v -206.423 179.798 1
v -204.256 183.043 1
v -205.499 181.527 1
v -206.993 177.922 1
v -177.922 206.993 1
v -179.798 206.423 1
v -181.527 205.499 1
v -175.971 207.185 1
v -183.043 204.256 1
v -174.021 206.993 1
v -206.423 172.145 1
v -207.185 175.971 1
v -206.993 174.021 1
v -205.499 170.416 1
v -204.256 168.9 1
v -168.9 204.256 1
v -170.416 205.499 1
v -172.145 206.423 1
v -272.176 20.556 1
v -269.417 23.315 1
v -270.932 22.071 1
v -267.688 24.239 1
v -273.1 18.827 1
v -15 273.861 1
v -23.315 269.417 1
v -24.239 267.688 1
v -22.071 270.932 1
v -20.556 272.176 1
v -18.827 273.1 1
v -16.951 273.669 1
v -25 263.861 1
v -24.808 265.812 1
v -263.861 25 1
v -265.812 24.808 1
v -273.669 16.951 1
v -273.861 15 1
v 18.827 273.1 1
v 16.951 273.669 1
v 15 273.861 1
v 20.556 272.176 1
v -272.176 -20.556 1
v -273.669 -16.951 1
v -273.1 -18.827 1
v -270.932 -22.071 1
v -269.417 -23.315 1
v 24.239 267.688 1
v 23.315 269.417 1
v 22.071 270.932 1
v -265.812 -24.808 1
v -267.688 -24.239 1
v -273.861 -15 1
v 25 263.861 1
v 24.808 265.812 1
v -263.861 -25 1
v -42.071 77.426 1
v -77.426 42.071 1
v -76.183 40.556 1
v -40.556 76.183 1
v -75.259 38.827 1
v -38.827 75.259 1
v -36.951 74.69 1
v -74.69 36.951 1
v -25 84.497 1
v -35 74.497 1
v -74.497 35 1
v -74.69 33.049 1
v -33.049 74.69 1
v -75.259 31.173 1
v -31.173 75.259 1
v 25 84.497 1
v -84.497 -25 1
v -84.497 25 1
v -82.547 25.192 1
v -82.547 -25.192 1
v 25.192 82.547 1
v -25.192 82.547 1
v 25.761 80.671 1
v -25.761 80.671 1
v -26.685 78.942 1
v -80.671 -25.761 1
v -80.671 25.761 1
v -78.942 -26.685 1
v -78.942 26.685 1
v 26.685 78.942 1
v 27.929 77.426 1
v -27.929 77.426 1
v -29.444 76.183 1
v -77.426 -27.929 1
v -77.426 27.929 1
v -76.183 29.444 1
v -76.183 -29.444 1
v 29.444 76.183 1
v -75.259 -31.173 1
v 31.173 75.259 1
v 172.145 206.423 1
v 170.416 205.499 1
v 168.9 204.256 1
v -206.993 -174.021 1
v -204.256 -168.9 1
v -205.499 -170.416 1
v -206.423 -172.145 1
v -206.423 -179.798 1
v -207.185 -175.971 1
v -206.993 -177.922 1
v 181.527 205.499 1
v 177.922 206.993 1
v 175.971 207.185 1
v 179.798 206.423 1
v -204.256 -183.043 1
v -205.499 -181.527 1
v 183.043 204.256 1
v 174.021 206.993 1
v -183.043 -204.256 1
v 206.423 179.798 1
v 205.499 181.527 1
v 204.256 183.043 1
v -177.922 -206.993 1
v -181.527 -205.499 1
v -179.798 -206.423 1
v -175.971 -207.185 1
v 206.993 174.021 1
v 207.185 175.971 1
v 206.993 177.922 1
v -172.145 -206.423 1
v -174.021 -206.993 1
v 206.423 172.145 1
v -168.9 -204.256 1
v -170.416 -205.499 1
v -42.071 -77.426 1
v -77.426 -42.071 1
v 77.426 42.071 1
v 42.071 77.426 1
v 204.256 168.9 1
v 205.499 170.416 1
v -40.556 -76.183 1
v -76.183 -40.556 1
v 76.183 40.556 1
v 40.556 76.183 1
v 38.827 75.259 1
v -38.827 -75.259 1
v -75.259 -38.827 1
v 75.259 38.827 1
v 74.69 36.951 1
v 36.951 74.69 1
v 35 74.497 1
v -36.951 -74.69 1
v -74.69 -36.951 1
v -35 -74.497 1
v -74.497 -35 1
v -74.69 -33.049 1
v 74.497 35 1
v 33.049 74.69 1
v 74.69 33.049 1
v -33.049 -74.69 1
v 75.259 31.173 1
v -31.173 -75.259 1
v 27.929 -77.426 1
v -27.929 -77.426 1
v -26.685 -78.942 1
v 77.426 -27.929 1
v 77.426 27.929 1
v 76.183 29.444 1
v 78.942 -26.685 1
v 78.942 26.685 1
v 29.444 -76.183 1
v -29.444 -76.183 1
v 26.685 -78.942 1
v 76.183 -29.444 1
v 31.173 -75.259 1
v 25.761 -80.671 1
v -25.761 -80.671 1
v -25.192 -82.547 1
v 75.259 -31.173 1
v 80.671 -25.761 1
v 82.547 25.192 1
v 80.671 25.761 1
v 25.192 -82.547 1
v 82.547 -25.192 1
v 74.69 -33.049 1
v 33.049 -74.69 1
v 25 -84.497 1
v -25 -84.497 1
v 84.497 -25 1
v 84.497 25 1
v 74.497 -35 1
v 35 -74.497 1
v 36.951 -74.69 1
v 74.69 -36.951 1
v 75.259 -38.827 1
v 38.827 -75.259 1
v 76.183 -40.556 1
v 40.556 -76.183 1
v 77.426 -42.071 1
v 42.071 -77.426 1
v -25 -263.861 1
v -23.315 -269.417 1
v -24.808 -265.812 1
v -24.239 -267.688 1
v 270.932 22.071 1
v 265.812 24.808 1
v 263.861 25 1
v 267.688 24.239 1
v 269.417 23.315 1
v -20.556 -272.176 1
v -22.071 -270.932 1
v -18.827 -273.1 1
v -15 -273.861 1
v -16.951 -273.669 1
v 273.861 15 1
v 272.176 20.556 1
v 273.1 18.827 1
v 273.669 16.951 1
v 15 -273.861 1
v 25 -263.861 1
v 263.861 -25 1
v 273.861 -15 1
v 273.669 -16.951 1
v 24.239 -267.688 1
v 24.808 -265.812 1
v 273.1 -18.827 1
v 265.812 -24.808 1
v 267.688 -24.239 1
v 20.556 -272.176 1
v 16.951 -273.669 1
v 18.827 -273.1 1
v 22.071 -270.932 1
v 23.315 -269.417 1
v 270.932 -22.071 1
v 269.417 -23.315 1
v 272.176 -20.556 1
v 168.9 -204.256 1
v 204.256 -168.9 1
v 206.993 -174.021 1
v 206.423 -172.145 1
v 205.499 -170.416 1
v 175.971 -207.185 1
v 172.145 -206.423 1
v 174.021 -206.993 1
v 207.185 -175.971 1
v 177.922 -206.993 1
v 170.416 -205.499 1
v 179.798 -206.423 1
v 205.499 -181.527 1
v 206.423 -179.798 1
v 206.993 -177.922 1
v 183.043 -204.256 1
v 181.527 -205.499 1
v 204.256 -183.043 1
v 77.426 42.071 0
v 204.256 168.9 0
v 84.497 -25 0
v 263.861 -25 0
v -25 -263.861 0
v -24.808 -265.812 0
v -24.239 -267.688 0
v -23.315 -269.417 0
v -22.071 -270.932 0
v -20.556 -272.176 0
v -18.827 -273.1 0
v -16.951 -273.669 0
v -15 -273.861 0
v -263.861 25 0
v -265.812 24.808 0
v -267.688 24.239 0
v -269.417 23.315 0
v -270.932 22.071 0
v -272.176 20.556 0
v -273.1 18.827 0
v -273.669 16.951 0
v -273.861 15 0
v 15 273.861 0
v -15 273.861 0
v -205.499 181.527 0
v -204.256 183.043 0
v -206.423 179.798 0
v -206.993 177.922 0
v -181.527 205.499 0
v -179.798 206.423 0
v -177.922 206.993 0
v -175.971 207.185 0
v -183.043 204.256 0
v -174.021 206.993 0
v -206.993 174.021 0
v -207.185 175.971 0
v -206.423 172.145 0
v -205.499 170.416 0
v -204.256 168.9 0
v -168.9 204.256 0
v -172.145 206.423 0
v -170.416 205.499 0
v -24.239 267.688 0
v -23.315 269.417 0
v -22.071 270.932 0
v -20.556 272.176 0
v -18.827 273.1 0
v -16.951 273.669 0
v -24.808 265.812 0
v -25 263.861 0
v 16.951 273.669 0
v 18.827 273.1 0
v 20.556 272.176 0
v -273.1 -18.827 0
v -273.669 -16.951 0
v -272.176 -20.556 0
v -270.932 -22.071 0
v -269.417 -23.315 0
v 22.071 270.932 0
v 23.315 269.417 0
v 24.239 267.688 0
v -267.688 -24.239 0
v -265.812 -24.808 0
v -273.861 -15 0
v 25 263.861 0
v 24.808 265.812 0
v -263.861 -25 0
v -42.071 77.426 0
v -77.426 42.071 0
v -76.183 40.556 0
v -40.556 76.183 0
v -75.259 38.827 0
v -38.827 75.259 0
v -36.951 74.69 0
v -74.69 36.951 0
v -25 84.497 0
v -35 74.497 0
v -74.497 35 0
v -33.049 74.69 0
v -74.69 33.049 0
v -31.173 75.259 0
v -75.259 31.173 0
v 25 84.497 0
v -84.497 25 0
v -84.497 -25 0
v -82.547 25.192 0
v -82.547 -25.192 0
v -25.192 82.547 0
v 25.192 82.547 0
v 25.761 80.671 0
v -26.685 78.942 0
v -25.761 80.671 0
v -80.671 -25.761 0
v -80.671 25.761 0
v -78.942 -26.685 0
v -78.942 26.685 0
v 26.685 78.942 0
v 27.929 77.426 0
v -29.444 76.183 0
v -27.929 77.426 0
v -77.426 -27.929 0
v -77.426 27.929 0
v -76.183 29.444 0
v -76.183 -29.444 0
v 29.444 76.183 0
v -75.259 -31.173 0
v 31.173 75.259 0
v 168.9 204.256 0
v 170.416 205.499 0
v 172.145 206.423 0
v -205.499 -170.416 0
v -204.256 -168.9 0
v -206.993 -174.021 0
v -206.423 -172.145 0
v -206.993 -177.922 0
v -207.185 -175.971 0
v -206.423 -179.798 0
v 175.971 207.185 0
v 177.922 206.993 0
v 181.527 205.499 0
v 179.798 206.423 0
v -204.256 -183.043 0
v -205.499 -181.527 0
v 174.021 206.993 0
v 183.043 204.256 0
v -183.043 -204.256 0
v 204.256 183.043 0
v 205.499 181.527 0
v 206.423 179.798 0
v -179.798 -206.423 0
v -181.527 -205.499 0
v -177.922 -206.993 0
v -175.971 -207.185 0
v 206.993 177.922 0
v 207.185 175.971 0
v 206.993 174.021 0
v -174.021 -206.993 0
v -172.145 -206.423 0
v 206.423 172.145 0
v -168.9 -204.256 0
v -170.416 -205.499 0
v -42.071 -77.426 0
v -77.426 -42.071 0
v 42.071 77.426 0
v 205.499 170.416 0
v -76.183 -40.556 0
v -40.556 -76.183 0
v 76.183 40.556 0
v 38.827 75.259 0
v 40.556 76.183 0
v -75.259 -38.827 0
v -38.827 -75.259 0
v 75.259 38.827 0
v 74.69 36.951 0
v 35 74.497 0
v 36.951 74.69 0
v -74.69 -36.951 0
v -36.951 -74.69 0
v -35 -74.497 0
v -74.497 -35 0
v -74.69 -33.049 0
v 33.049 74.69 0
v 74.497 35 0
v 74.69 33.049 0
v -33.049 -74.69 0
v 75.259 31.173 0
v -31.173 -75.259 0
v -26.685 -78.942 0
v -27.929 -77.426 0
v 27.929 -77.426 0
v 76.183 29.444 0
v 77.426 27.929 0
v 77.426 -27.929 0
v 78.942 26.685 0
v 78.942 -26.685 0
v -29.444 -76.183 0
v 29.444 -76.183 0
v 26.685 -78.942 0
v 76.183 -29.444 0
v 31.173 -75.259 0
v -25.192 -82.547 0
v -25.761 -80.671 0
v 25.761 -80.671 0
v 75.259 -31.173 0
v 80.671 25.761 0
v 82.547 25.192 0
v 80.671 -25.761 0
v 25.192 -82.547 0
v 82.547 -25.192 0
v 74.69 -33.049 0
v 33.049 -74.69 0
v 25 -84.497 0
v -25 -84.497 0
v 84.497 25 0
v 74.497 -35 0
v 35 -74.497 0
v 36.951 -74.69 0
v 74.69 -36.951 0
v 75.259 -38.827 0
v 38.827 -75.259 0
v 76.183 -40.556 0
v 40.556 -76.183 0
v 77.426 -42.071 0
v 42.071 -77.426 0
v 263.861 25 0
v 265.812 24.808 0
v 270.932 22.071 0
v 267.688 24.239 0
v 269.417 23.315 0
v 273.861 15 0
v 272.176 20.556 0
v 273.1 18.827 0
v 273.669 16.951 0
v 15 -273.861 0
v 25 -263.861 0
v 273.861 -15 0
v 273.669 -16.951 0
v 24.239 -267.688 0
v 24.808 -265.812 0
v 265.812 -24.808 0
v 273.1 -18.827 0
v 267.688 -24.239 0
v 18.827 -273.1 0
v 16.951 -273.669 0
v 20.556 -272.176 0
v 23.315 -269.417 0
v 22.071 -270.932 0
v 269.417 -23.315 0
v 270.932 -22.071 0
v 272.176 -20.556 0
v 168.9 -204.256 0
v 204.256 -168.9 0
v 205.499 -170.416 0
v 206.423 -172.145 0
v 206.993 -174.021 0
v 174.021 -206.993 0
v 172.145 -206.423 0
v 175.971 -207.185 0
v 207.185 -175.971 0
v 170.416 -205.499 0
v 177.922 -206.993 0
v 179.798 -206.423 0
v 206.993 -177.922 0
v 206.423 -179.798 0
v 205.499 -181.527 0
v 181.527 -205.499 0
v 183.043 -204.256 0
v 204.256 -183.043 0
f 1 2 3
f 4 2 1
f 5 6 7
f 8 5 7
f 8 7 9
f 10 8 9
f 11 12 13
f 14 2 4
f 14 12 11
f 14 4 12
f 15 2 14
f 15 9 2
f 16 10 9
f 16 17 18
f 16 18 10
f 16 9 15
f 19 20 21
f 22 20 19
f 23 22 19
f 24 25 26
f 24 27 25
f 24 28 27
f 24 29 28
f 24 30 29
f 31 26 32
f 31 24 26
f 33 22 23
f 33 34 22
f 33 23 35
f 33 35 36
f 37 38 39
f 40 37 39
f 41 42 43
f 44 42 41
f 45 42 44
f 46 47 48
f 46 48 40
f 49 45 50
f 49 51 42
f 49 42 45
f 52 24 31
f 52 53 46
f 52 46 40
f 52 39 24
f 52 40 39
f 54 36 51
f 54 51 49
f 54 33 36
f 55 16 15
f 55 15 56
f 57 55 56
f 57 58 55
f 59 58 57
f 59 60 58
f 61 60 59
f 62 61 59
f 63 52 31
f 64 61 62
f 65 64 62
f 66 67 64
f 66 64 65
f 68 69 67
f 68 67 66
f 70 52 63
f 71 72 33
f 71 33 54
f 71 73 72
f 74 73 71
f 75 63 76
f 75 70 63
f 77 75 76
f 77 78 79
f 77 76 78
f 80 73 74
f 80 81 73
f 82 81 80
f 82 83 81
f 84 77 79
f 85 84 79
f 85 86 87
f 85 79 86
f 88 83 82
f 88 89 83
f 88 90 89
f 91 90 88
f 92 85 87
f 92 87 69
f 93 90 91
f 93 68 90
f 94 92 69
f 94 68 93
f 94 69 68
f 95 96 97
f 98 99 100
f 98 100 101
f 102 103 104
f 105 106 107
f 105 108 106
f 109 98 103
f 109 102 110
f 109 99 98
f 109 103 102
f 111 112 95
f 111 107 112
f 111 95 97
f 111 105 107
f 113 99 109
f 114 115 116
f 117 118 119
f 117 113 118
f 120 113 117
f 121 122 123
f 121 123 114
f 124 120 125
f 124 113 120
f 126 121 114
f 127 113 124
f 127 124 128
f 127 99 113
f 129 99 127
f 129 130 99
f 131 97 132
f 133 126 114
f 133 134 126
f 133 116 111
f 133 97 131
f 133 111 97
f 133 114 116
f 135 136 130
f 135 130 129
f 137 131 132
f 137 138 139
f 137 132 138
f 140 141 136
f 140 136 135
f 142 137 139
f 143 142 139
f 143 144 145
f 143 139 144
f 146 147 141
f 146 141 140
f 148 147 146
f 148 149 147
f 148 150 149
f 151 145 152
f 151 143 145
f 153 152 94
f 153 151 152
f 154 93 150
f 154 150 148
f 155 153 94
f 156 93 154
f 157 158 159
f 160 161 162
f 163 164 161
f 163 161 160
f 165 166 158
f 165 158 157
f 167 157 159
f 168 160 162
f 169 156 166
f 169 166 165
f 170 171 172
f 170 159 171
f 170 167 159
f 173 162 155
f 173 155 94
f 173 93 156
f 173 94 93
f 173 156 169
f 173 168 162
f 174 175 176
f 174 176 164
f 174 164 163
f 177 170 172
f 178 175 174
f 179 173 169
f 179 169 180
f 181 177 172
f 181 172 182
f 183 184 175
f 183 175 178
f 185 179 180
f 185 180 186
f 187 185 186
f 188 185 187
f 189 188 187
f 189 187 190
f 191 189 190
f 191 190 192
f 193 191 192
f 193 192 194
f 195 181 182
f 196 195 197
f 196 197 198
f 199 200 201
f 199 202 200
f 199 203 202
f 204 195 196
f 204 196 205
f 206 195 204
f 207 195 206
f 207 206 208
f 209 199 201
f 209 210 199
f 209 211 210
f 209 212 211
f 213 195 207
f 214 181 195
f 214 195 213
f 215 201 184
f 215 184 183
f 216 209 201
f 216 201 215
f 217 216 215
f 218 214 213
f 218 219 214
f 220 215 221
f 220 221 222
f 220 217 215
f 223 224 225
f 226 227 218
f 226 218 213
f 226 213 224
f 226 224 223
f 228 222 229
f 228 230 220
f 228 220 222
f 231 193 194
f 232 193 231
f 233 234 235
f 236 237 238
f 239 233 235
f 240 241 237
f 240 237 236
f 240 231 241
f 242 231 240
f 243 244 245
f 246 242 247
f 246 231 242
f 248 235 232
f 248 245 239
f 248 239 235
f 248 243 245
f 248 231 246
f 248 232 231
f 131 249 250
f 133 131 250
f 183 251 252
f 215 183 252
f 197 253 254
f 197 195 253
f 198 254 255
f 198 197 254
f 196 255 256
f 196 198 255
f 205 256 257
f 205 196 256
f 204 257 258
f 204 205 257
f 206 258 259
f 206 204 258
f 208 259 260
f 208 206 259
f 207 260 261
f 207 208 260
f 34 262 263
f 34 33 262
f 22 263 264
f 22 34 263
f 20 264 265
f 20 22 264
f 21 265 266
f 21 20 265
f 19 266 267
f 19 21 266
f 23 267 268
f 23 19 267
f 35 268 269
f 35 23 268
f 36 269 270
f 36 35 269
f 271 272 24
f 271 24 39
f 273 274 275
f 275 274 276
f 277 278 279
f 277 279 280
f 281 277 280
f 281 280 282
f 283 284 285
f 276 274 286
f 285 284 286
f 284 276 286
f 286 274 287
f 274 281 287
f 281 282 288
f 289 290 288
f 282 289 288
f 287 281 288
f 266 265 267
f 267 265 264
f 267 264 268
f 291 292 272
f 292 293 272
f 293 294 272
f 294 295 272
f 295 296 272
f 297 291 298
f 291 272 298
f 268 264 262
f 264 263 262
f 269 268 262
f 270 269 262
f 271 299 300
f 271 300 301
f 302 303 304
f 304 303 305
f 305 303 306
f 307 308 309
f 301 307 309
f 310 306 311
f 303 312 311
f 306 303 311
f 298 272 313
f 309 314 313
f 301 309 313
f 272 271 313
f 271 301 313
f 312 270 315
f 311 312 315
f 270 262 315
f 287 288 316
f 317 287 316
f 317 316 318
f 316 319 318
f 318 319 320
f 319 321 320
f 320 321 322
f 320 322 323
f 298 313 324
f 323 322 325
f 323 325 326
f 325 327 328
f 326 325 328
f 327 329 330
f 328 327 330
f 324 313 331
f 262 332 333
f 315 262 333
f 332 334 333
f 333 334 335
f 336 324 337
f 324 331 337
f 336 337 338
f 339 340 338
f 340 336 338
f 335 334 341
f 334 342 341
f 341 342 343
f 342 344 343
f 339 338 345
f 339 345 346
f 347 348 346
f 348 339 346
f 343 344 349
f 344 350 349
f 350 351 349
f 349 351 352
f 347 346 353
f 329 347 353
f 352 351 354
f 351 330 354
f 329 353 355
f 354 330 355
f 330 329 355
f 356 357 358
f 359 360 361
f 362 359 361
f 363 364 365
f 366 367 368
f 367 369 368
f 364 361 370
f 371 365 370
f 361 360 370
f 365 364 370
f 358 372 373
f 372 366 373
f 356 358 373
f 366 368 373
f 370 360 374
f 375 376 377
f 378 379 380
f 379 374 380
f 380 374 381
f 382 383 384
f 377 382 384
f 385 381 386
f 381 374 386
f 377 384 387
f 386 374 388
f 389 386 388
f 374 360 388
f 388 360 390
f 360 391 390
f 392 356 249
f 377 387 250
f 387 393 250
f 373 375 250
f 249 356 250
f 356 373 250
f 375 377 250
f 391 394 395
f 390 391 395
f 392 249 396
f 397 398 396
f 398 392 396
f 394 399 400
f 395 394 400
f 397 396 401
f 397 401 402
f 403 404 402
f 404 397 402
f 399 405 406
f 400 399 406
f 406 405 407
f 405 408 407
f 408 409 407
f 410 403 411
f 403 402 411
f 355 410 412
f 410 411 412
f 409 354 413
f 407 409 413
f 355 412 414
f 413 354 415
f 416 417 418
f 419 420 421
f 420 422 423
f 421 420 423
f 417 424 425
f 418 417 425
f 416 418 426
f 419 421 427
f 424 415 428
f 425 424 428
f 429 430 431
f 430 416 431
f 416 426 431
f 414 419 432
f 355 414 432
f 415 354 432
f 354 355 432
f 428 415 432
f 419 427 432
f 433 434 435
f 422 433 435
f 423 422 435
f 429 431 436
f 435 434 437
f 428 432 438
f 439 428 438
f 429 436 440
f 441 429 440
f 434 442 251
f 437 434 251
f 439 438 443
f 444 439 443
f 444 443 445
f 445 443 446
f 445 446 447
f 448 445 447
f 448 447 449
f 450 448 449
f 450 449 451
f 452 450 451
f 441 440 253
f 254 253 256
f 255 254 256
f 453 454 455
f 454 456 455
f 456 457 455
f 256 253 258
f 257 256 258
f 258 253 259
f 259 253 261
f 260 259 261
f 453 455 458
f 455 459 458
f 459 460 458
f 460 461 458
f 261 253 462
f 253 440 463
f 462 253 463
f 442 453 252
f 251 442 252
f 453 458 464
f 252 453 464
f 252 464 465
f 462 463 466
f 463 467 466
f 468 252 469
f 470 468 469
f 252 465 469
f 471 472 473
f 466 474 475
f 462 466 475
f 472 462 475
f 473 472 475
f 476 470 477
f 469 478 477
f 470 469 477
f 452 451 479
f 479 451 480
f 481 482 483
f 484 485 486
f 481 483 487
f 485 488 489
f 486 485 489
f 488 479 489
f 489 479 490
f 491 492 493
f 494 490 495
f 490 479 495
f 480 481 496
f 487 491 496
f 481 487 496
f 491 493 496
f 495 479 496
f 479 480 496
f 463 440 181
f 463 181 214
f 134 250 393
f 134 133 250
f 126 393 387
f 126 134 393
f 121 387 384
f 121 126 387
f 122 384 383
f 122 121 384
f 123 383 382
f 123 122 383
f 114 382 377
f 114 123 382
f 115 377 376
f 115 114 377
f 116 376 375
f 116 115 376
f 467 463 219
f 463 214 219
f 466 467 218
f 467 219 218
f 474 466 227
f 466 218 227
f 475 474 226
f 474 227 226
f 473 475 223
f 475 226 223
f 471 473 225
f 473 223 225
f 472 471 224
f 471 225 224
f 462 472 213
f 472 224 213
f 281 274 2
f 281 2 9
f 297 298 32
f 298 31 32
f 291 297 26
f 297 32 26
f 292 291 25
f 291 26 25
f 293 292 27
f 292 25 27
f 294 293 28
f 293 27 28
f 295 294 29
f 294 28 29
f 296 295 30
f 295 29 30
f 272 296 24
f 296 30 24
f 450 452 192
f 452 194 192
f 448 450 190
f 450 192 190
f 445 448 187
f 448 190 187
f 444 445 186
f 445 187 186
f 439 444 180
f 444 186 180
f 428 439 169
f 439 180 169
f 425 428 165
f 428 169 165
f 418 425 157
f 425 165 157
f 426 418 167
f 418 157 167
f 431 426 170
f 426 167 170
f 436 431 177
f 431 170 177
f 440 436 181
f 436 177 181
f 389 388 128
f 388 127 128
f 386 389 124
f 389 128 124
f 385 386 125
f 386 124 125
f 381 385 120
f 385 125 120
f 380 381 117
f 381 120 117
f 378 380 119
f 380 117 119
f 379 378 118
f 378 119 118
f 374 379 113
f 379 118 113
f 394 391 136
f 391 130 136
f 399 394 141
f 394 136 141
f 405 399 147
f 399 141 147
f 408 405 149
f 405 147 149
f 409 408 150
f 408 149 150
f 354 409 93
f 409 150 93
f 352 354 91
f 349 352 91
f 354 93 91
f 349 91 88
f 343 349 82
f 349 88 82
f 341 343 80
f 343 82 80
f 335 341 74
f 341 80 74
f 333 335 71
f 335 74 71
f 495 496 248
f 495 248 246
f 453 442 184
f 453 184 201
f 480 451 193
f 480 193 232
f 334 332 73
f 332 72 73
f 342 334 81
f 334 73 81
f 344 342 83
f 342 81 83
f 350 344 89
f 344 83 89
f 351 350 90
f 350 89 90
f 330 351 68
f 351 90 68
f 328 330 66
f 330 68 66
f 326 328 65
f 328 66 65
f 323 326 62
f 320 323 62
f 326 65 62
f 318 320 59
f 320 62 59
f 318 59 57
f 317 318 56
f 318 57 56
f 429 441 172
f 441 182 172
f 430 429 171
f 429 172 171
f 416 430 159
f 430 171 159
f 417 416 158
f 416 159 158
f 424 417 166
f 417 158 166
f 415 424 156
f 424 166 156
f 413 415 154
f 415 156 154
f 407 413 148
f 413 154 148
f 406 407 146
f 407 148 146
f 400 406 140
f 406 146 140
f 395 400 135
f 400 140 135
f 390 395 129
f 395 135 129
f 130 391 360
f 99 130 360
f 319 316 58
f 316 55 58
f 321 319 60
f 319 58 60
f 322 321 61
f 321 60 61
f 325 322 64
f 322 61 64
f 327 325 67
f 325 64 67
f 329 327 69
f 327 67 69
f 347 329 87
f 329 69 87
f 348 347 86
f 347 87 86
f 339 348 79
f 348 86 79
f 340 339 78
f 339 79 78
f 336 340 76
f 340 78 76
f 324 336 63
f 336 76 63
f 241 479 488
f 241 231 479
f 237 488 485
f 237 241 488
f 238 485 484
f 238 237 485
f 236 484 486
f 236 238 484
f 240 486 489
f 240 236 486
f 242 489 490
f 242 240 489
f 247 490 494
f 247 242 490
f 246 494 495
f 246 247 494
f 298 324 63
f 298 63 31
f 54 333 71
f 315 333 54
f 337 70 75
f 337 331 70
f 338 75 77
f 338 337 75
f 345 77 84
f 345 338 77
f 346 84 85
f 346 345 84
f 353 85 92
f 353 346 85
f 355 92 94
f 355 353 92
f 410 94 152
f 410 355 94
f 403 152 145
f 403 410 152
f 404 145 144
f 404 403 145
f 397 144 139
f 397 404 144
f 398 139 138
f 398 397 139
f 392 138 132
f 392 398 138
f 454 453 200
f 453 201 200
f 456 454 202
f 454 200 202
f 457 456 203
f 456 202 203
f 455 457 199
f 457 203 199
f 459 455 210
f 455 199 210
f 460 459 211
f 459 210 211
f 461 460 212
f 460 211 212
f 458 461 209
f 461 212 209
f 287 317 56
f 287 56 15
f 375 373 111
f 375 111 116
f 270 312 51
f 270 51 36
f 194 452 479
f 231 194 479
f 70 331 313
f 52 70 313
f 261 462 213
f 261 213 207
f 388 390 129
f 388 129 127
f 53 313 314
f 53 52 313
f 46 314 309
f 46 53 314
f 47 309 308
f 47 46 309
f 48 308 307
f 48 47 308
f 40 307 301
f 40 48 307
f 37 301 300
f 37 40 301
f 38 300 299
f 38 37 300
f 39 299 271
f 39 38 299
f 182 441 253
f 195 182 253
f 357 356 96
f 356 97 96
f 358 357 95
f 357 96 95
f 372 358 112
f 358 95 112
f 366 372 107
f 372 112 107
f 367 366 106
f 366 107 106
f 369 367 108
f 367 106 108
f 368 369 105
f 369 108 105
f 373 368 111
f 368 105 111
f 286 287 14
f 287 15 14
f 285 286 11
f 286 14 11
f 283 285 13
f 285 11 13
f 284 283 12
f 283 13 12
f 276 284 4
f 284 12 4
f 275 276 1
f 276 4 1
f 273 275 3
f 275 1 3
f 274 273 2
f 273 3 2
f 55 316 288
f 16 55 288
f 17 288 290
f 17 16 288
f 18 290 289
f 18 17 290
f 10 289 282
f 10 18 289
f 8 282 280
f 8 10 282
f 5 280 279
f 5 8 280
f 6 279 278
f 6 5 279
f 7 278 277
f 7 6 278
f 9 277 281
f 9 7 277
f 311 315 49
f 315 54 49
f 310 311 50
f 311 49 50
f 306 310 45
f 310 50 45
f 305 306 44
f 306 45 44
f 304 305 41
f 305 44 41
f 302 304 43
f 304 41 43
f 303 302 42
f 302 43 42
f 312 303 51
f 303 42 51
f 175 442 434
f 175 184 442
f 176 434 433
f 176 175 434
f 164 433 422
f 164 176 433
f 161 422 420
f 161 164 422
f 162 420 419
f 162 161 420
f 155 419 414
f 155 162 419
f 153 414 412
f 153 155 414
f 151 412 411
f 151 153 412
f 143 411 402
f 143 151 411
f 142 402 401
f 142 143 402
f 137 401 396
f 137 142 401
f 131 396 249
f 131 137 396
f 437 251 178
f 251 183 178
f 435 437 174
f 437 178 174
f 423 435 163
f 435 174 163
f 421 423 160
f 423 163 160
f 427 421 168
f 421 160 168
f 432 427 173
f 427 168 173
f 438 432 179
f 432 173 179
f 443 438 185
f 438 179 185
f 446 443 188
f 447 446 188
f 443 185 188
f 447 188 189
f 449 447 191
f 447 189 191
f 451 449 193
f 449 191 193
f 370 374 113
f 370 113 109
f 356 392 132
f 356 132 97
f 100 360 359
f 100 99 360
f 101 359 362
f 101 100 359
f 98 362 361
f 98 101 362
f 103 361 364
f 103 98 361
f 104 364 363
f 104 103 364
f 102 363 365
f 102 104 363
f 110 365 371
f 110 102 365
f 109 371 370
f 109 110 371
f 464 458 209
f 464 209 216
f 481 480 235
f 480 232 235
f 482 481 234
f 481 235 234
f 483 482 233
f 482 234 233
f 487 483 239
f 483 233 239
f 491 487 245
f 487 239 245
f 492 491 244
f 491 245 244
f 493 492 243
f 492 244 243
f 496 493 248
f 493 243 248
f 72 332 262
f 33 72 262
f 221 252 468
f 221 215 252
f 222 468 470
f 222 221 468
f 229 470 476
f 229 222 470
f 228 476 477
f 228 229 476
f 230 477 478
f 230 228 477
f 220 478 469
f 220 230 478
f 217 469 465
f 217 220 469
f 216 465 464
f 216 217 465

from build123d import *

# Parameters (mm, degrees)
F0_R     = 64
F1_DEPTH = 1
F2_W     = 50
F2_H     = 214.946085466
F3_DEPTH = 1
F4_R     = 10
F5_COUNT = 8
F6_R     = 10


with BuildPart() as f1:
    # F0 (on Top) → F1 (new body)
    with BuildSketch(Plane.XY):
        Circle(F0_R)
    extrude(amount=F1_DEPTH)

    # F2 (on Top) → F3 (join)
    with BuildSketch(Plane.XY):
        with Locations((0, 166.3882360196)):
            Rectangle(F2_W, F2_H)
    extrude(amount=F3_DEPTH)

    # F4
    f4_edges = [f1.edges().sort_by_distance(p)[0] for p in [
        (-25, 273.861279, 0.5),
        (25, 273.861279, 0.5),
    ]]
    fillet(f4_edges, radius=F4_R)

    # F5: F1 ×8 about axis
    f5_axis = Axis((0, 0, 0), (0, 0, 1))


with BuildPart() as f1_1:
    add(f1.part)
    for i in range(1, F5_COUNT):
        add(f1.part.rotate(f5_axis, i * 360 / F5_COUNT))

    # F6
    f6_edges = [f1_1.edges().sort_by_distance(p)[0] for p in [
        (25, -60.355339, 0.5),
        (25, 60.355339, 0.5),
        (-25, 60.355339, 0.5),
        (-25, -60.355339, 0.5),
        (60.355339, -25, 0.5),
        (60.355339, 25, 0.5),
        (-60.355339, -25, 0.5),
        (-60.355339, 25, 0.5),
    ]]
    fillet(f6_edges, radius=F6_R)


solid = f1_1.part
